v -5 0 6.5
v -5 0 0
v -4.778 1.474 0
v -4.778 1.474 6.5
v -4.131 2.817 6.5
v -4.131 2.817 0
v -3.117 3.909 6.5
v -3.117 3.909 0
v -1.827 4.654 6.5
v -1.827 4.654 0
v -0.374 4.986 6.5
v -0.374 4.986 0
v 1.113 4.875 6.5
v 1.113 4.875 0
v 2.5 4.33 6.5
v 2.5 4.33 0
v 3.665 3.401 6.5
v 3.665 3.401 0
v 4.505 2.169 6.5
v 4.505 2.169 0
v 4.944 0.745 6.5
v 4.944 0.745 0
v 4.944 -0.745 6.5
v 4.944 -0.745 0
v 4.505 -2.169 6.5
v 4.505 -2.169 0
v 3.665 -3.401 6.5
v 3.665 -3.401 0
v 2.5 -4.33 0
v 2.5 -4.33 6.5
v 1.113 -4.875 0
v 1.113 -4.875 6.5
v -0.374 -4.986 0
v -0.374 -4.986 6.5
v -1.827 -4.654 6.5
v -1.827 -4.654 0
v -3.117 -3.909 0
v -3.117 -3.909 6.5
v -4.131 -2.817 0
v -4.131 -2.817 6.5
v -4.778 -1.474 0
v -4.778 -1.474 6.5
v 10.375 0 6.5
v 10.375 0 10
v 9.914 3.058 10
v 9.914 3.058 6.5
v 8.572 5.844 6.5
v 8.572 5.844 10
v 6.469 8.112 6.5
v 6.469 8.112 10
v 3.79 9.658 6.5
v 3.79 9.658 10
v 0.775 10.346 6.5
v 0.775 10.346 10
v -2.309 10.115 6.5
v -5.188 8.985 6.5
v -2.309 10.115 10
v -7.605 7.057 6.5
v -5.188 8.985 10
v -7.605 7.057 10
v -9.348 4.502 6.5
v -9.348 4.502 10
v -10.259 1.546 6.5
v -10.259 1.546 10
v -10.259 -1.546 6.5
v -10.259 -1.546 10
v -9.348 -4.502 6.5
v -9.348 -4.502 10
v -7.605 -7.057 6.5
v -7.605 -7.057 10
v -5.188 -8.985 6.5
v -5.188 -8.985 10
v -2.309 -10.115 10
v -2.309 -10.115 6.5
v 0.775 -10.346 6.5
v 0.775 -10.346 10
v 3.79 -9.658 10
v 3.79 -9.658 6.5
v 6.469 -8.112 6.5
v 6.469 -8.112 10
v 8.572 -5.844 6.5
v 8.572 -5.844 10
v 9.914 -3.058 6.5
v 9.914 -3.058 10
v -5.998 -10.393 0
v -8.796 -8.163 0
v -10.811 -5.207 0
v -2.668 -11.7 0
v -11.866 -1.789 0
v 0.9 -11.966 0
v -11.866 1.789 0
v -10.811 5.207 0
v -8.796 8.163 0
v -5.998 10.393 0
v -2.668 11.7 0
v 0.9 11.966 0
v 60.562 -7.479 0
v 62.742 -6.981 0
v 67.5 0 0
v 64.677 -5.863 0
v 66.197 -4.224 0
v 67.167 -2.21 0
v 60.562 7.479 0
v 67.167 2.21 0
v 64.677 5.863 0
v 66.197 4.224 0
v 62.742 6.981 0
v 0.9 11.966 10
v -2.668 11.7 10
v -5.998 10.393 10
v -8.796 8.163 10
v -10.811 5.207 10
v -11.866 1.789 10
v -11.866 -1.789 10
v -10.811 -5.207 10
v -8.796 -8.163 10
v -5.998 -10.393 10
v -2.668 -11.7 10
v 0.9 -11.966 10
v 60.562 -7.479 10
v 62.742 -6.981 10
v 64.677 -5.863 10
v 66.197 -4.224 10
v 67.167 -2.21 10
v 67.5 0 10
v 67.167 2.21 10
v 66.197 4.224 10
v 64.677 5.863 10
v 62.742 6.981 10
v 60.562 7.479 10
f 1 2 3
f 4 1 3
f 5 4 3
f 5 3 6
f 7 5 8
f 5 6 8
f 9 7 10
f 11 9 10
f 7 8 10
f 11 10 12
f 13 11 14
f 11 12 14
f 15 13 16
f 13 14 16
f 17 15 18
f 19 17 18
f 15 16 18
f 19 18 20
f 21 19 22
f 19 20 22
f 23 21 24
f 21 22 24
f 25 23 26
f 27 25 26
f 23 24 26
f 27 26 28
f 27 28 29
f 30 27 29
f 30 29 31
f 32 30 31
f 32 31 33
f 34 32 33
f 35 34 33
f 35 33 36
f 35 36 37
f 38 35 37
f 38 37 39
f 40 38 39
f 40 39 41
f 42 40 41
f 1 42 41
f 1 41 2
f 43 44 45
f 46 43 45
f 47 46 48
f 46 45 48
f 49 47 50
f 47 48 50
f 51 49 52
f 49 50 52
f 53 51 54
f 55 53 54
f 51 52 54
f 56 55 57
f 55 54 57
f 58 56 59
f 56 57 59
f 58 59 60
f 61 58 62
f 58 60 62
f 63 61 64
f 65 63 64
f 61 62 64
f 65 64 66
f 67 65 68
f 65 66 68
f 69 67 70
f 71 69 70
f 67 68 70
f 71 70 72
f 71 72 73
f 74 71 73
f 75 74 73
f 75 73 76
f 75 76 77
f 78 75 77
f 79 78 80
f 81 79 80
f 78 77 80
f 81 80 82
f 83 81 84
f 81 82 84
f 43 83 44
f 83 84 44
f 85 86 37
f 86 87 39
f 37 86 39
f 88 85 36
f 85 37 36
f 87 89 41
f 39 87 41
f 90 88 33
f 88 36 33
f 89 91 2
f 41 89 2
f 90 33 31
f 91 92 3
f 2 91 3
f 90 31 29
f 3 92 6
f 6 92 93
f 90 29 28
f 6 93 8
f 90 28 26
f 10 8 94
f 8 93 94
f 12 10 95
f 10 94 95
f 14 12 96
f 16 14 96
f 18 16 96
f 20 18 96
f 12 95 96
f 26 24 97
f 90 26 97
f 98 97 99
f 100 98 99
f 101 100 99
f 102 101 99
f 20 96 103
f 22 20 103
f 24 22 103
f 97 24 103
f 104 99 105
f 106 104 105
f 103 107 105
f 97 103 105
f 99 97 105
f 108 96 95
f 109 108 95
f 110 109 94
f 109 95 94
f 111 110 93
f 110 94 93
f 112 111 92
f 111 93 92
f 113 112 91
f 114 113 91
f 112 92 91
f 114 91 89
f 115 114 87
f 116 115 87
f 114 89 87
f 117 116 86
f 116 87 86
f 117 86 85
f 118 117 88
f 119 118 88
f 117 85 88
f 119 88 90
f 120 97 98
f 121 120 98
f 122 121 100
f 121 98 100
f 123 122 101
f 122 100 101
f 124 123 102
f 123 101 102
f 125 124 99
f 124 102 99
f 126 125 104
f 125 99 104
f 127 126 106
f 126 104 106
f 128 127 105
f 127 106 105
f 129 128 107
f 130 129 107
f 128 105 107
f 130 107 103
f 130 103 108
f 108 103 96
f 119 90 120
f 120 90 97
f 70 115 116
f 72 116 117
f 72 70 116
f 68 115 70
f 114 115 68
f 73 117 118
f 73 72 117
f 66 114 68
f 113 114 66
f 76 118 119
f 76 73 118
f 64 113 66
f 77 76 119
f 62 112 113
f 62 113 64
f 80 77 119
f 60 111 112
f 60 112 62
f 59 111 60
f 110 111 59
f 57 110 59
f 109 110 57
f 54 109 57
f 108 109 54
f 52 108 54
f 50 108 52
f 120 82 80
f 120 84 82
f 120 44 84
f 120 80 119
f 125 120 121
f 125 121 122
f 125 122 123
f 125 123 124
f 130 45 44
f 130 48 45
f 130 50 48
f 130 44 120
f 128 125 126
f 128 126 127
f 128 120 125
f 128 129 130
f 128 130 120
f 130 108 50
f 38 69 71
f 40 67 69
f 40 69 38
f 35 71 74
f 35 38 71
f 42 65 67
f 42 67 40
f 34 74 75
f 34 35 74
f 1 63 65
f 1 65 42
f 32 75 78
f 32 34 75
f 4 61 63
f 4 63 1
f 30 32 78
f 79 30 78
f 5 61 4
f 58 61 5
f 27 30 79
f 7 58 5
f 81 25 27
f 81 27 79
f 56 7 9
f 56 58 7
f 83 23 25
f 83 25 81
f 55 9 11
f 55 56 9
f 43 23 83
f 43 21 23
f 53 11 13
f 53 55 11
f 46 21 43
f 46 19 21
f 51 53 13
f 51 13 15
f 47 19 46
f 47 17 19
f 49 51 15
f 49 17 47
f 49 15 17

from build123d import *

# Parameters (mm, degrees)
EXTRUDE_1_DEPTH     = 10
SKETCH_2_R          = 10.375
CUT_EXTRUDE_1_DEPTH = 3.5
SKETCH_3_R          = 5
CUT_EXTRUDE_2_DEPTH = 70.283836499


with BuildPart() as part:
    # 草图1 → 凸台-拉伸1 (new body)
    with BuildSketch(Plane.XY):
        with BuildLine():
            Line((0.9, -11.966202405), (60.5625, -7.478876503))
            ThreePointArc((60.5625, -7.478876503), (67.5, 0), (60.5625, 7.478876503))
            Line((60.5625, 7.478876503), (0.9, 11.966202405))
            ThreePointArc((0.9, 11.966202405), (-12, 0), (0.9, -11.966202405))
        make_face()
    extrude(amount=EXTRUDE_1_DEPTH)

    # 草图2 → 切除-拉伸1 (cut)
    with BuildSketch(Plane.XY.offset(10)):
        Circle(SKETCH_2_R)
    extrude(amount=-CUT_EXTRUDE_1_DEPTH, mode=Mode.SUBTRACT)

    # 草图3 → 切除-拉伸2 (cut, through all)
    with BuildSketch(Plane(origin=(0, 0, 0), x_dir=(-1, 0, 0), z_dir=(0, 0, -1))):
        Circle(SKETCH_3_R)
    extrude(amount=-CUT_EXTRUDE_2_DEPTH, mode=Mode.SUBTRACT)


solid = part.part
